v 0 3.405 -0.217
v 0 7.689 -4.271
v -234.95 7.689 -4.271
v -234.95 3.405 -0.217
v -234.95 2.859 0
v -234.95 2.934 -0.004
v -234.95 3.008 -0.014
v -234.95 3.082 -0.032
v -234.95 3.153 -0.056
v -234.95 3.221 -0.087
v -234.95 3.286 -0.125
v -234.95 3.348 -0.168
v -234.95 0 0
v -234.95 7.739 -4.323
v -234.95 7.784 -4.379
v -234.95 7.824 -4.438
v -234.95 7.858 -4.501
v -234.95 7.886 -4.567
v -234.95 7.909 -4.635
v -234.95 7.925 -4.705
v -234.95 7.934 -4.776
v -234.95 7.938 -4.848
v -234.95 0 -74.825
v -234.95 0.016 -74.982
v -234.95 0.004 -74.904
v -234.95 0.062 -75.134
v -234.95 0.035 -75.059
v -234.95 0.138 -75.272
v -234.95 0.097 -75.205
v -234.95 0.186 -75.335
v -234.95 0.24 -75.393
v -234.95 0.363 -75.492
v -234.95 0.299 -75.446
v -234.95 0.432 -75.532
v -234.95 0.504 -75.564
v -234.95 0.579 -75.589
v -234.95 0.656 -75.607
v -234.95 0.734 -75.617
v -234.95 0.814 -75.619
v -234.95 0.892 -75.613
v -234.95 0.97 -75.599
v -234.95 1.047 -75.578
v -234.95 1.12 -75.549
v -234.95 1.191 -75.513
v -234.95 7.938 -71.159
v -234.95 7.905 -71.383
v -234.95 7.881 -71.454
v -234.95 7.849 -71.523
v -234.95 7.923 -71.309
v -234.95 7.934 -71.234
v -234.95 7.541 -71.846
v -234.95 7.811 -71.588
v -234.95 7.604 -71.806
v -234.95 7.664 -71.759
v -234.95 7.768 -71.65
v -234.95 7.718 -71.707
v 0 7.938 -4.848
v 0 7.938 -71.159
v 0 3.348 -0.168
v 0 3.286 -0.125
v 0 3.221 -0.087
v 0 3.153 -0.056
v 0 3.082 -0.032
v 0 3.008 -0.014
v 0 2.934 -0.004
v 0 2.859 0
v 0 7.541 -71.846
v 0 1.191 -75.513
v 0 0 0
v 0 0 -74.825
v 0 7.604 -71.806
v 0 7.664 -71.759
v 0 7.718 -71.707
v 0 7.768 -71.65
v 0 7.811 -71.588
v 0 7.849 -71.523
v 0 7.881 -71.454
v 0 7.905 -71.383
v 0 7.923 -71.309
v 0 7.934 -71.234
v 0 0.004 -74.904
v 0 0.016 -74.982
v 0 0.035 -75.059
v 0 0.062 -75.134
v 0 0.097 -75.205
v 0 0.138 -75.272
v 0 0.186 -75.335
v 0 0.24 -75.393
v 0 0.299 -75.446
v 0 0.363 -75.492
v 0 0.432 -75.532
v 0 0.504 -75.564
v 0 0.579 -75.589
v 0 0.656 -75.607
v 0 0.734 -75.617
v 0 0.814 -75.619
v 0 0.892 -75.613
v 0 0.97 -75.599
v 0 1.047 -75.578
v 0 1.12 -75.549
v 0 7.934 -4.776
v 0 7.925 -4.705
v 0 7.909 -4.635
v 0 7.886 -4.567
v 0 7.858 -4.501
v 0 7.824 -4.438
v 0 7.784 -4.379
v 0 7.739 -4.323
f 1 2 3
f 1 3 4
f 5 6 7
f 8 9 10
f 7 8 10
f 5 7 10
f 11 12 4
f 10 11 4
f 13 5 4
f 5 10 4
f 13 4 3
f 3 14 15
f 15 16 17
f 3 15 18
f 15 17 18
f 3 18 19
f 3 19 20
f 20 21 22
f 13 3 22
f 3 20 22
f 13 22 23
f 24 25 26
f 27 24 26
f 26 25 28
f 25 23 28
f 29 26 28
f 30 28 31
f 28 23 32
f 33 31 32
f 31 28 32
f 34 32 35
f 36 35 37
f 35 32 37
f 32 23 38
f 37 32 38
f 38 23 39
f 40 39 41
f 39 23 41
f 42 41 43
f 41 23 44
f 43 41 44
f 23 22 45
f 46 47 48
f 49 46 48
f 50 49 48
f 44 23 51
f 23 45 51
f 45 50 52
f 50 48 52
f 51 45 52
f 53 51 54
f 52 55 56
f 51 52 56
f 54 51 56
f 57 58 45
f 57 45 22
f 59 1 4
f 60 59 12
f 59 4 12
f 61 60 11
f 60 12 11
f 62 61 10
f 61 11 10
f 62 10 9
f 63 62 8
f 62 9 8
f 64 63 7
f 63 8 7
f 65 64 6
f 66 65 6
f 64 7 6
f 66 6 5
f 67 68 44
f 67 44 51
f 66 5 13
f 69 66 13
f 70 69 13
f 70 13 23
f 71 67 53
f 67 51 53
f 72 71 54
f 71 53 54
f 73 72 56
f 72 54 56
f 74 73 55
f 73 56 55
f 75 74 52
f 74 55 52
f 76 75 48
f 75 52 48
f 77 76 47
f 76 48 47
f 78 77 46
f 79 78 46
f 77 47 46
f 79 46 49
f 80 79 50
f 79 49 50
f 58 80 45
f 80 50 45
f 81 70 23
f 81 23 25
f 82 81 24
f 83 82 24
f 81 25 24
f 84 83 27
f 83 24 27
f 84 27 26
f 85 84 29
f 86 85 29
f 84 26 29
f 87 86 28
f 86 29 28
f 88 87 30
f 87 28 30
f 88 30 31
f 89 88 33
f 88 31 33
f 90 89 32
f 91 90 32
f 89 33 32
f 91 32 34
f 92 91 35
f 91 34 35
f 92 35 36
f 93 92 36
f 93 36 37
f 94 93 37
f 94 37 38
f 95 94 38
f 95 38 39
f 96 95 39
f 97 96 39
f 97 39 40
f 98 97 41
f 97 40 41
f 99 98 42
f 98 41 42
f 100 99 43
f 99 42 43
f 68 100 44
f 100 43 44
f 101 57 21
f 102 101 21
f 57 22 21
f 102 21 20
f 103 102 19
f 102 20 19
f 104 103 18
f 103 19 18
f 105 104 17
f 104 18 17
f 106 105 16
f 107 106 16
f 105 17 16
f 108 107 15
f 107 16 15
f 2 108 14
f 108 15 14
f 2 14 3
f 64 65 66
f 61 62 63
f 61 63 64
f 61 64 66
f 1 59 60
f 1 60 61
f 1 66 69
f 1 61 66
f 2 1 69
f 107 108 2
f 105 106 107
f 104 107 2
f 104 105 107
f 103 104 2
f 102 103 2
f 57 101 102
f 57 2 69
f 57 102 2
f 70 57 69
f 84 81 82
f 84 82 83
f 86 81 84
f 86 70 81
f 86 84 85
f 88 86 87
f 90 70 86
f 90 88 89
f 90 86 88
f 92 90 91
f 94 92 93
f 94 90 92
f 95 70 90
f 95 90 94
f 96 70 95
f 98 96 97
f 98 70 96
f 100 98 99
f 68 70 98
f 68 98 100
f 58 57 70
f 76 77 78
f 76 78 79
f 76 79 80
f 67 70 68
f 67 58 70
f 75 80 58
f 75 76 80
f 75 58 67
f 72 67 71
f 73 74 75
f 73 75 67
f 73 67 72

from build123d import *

# Parameters (mm, degrees)
BOSS_EXTRUDE1_DEPTH = 234.95
FILLET1_R           = 0.79375


with BuildPart() as part:
    # Sketch1 → Boss-Extrude1 (new body)
    with BuildSketch(Plane(origin=(0, 0, 0), x_dir=(0, 0, -1), z_dir=(1, 0, 0))):
        Polygon((0, 0), (76.2, 0), (71.617282238, 7.9375), (4.506031045, 7.9375), (0, 3.175), align=None)
    extrude(amount=-BOSS_EXTRUDE1_DEPTH)

    # Fillet1
    fillet1_edges = [part.edges().sort_by_distance(p)[0] for p in [
        (-117.475, 3.175, 0),
        (-117.475, 7.9375, -4.506031045),
        (-117.475, 7.9375, -71.617282238),
        (-117.475, 0, -76.2),
    ]]
    fillet(fillet1_edges, radius=FILLET1_R)


solid = part.part
